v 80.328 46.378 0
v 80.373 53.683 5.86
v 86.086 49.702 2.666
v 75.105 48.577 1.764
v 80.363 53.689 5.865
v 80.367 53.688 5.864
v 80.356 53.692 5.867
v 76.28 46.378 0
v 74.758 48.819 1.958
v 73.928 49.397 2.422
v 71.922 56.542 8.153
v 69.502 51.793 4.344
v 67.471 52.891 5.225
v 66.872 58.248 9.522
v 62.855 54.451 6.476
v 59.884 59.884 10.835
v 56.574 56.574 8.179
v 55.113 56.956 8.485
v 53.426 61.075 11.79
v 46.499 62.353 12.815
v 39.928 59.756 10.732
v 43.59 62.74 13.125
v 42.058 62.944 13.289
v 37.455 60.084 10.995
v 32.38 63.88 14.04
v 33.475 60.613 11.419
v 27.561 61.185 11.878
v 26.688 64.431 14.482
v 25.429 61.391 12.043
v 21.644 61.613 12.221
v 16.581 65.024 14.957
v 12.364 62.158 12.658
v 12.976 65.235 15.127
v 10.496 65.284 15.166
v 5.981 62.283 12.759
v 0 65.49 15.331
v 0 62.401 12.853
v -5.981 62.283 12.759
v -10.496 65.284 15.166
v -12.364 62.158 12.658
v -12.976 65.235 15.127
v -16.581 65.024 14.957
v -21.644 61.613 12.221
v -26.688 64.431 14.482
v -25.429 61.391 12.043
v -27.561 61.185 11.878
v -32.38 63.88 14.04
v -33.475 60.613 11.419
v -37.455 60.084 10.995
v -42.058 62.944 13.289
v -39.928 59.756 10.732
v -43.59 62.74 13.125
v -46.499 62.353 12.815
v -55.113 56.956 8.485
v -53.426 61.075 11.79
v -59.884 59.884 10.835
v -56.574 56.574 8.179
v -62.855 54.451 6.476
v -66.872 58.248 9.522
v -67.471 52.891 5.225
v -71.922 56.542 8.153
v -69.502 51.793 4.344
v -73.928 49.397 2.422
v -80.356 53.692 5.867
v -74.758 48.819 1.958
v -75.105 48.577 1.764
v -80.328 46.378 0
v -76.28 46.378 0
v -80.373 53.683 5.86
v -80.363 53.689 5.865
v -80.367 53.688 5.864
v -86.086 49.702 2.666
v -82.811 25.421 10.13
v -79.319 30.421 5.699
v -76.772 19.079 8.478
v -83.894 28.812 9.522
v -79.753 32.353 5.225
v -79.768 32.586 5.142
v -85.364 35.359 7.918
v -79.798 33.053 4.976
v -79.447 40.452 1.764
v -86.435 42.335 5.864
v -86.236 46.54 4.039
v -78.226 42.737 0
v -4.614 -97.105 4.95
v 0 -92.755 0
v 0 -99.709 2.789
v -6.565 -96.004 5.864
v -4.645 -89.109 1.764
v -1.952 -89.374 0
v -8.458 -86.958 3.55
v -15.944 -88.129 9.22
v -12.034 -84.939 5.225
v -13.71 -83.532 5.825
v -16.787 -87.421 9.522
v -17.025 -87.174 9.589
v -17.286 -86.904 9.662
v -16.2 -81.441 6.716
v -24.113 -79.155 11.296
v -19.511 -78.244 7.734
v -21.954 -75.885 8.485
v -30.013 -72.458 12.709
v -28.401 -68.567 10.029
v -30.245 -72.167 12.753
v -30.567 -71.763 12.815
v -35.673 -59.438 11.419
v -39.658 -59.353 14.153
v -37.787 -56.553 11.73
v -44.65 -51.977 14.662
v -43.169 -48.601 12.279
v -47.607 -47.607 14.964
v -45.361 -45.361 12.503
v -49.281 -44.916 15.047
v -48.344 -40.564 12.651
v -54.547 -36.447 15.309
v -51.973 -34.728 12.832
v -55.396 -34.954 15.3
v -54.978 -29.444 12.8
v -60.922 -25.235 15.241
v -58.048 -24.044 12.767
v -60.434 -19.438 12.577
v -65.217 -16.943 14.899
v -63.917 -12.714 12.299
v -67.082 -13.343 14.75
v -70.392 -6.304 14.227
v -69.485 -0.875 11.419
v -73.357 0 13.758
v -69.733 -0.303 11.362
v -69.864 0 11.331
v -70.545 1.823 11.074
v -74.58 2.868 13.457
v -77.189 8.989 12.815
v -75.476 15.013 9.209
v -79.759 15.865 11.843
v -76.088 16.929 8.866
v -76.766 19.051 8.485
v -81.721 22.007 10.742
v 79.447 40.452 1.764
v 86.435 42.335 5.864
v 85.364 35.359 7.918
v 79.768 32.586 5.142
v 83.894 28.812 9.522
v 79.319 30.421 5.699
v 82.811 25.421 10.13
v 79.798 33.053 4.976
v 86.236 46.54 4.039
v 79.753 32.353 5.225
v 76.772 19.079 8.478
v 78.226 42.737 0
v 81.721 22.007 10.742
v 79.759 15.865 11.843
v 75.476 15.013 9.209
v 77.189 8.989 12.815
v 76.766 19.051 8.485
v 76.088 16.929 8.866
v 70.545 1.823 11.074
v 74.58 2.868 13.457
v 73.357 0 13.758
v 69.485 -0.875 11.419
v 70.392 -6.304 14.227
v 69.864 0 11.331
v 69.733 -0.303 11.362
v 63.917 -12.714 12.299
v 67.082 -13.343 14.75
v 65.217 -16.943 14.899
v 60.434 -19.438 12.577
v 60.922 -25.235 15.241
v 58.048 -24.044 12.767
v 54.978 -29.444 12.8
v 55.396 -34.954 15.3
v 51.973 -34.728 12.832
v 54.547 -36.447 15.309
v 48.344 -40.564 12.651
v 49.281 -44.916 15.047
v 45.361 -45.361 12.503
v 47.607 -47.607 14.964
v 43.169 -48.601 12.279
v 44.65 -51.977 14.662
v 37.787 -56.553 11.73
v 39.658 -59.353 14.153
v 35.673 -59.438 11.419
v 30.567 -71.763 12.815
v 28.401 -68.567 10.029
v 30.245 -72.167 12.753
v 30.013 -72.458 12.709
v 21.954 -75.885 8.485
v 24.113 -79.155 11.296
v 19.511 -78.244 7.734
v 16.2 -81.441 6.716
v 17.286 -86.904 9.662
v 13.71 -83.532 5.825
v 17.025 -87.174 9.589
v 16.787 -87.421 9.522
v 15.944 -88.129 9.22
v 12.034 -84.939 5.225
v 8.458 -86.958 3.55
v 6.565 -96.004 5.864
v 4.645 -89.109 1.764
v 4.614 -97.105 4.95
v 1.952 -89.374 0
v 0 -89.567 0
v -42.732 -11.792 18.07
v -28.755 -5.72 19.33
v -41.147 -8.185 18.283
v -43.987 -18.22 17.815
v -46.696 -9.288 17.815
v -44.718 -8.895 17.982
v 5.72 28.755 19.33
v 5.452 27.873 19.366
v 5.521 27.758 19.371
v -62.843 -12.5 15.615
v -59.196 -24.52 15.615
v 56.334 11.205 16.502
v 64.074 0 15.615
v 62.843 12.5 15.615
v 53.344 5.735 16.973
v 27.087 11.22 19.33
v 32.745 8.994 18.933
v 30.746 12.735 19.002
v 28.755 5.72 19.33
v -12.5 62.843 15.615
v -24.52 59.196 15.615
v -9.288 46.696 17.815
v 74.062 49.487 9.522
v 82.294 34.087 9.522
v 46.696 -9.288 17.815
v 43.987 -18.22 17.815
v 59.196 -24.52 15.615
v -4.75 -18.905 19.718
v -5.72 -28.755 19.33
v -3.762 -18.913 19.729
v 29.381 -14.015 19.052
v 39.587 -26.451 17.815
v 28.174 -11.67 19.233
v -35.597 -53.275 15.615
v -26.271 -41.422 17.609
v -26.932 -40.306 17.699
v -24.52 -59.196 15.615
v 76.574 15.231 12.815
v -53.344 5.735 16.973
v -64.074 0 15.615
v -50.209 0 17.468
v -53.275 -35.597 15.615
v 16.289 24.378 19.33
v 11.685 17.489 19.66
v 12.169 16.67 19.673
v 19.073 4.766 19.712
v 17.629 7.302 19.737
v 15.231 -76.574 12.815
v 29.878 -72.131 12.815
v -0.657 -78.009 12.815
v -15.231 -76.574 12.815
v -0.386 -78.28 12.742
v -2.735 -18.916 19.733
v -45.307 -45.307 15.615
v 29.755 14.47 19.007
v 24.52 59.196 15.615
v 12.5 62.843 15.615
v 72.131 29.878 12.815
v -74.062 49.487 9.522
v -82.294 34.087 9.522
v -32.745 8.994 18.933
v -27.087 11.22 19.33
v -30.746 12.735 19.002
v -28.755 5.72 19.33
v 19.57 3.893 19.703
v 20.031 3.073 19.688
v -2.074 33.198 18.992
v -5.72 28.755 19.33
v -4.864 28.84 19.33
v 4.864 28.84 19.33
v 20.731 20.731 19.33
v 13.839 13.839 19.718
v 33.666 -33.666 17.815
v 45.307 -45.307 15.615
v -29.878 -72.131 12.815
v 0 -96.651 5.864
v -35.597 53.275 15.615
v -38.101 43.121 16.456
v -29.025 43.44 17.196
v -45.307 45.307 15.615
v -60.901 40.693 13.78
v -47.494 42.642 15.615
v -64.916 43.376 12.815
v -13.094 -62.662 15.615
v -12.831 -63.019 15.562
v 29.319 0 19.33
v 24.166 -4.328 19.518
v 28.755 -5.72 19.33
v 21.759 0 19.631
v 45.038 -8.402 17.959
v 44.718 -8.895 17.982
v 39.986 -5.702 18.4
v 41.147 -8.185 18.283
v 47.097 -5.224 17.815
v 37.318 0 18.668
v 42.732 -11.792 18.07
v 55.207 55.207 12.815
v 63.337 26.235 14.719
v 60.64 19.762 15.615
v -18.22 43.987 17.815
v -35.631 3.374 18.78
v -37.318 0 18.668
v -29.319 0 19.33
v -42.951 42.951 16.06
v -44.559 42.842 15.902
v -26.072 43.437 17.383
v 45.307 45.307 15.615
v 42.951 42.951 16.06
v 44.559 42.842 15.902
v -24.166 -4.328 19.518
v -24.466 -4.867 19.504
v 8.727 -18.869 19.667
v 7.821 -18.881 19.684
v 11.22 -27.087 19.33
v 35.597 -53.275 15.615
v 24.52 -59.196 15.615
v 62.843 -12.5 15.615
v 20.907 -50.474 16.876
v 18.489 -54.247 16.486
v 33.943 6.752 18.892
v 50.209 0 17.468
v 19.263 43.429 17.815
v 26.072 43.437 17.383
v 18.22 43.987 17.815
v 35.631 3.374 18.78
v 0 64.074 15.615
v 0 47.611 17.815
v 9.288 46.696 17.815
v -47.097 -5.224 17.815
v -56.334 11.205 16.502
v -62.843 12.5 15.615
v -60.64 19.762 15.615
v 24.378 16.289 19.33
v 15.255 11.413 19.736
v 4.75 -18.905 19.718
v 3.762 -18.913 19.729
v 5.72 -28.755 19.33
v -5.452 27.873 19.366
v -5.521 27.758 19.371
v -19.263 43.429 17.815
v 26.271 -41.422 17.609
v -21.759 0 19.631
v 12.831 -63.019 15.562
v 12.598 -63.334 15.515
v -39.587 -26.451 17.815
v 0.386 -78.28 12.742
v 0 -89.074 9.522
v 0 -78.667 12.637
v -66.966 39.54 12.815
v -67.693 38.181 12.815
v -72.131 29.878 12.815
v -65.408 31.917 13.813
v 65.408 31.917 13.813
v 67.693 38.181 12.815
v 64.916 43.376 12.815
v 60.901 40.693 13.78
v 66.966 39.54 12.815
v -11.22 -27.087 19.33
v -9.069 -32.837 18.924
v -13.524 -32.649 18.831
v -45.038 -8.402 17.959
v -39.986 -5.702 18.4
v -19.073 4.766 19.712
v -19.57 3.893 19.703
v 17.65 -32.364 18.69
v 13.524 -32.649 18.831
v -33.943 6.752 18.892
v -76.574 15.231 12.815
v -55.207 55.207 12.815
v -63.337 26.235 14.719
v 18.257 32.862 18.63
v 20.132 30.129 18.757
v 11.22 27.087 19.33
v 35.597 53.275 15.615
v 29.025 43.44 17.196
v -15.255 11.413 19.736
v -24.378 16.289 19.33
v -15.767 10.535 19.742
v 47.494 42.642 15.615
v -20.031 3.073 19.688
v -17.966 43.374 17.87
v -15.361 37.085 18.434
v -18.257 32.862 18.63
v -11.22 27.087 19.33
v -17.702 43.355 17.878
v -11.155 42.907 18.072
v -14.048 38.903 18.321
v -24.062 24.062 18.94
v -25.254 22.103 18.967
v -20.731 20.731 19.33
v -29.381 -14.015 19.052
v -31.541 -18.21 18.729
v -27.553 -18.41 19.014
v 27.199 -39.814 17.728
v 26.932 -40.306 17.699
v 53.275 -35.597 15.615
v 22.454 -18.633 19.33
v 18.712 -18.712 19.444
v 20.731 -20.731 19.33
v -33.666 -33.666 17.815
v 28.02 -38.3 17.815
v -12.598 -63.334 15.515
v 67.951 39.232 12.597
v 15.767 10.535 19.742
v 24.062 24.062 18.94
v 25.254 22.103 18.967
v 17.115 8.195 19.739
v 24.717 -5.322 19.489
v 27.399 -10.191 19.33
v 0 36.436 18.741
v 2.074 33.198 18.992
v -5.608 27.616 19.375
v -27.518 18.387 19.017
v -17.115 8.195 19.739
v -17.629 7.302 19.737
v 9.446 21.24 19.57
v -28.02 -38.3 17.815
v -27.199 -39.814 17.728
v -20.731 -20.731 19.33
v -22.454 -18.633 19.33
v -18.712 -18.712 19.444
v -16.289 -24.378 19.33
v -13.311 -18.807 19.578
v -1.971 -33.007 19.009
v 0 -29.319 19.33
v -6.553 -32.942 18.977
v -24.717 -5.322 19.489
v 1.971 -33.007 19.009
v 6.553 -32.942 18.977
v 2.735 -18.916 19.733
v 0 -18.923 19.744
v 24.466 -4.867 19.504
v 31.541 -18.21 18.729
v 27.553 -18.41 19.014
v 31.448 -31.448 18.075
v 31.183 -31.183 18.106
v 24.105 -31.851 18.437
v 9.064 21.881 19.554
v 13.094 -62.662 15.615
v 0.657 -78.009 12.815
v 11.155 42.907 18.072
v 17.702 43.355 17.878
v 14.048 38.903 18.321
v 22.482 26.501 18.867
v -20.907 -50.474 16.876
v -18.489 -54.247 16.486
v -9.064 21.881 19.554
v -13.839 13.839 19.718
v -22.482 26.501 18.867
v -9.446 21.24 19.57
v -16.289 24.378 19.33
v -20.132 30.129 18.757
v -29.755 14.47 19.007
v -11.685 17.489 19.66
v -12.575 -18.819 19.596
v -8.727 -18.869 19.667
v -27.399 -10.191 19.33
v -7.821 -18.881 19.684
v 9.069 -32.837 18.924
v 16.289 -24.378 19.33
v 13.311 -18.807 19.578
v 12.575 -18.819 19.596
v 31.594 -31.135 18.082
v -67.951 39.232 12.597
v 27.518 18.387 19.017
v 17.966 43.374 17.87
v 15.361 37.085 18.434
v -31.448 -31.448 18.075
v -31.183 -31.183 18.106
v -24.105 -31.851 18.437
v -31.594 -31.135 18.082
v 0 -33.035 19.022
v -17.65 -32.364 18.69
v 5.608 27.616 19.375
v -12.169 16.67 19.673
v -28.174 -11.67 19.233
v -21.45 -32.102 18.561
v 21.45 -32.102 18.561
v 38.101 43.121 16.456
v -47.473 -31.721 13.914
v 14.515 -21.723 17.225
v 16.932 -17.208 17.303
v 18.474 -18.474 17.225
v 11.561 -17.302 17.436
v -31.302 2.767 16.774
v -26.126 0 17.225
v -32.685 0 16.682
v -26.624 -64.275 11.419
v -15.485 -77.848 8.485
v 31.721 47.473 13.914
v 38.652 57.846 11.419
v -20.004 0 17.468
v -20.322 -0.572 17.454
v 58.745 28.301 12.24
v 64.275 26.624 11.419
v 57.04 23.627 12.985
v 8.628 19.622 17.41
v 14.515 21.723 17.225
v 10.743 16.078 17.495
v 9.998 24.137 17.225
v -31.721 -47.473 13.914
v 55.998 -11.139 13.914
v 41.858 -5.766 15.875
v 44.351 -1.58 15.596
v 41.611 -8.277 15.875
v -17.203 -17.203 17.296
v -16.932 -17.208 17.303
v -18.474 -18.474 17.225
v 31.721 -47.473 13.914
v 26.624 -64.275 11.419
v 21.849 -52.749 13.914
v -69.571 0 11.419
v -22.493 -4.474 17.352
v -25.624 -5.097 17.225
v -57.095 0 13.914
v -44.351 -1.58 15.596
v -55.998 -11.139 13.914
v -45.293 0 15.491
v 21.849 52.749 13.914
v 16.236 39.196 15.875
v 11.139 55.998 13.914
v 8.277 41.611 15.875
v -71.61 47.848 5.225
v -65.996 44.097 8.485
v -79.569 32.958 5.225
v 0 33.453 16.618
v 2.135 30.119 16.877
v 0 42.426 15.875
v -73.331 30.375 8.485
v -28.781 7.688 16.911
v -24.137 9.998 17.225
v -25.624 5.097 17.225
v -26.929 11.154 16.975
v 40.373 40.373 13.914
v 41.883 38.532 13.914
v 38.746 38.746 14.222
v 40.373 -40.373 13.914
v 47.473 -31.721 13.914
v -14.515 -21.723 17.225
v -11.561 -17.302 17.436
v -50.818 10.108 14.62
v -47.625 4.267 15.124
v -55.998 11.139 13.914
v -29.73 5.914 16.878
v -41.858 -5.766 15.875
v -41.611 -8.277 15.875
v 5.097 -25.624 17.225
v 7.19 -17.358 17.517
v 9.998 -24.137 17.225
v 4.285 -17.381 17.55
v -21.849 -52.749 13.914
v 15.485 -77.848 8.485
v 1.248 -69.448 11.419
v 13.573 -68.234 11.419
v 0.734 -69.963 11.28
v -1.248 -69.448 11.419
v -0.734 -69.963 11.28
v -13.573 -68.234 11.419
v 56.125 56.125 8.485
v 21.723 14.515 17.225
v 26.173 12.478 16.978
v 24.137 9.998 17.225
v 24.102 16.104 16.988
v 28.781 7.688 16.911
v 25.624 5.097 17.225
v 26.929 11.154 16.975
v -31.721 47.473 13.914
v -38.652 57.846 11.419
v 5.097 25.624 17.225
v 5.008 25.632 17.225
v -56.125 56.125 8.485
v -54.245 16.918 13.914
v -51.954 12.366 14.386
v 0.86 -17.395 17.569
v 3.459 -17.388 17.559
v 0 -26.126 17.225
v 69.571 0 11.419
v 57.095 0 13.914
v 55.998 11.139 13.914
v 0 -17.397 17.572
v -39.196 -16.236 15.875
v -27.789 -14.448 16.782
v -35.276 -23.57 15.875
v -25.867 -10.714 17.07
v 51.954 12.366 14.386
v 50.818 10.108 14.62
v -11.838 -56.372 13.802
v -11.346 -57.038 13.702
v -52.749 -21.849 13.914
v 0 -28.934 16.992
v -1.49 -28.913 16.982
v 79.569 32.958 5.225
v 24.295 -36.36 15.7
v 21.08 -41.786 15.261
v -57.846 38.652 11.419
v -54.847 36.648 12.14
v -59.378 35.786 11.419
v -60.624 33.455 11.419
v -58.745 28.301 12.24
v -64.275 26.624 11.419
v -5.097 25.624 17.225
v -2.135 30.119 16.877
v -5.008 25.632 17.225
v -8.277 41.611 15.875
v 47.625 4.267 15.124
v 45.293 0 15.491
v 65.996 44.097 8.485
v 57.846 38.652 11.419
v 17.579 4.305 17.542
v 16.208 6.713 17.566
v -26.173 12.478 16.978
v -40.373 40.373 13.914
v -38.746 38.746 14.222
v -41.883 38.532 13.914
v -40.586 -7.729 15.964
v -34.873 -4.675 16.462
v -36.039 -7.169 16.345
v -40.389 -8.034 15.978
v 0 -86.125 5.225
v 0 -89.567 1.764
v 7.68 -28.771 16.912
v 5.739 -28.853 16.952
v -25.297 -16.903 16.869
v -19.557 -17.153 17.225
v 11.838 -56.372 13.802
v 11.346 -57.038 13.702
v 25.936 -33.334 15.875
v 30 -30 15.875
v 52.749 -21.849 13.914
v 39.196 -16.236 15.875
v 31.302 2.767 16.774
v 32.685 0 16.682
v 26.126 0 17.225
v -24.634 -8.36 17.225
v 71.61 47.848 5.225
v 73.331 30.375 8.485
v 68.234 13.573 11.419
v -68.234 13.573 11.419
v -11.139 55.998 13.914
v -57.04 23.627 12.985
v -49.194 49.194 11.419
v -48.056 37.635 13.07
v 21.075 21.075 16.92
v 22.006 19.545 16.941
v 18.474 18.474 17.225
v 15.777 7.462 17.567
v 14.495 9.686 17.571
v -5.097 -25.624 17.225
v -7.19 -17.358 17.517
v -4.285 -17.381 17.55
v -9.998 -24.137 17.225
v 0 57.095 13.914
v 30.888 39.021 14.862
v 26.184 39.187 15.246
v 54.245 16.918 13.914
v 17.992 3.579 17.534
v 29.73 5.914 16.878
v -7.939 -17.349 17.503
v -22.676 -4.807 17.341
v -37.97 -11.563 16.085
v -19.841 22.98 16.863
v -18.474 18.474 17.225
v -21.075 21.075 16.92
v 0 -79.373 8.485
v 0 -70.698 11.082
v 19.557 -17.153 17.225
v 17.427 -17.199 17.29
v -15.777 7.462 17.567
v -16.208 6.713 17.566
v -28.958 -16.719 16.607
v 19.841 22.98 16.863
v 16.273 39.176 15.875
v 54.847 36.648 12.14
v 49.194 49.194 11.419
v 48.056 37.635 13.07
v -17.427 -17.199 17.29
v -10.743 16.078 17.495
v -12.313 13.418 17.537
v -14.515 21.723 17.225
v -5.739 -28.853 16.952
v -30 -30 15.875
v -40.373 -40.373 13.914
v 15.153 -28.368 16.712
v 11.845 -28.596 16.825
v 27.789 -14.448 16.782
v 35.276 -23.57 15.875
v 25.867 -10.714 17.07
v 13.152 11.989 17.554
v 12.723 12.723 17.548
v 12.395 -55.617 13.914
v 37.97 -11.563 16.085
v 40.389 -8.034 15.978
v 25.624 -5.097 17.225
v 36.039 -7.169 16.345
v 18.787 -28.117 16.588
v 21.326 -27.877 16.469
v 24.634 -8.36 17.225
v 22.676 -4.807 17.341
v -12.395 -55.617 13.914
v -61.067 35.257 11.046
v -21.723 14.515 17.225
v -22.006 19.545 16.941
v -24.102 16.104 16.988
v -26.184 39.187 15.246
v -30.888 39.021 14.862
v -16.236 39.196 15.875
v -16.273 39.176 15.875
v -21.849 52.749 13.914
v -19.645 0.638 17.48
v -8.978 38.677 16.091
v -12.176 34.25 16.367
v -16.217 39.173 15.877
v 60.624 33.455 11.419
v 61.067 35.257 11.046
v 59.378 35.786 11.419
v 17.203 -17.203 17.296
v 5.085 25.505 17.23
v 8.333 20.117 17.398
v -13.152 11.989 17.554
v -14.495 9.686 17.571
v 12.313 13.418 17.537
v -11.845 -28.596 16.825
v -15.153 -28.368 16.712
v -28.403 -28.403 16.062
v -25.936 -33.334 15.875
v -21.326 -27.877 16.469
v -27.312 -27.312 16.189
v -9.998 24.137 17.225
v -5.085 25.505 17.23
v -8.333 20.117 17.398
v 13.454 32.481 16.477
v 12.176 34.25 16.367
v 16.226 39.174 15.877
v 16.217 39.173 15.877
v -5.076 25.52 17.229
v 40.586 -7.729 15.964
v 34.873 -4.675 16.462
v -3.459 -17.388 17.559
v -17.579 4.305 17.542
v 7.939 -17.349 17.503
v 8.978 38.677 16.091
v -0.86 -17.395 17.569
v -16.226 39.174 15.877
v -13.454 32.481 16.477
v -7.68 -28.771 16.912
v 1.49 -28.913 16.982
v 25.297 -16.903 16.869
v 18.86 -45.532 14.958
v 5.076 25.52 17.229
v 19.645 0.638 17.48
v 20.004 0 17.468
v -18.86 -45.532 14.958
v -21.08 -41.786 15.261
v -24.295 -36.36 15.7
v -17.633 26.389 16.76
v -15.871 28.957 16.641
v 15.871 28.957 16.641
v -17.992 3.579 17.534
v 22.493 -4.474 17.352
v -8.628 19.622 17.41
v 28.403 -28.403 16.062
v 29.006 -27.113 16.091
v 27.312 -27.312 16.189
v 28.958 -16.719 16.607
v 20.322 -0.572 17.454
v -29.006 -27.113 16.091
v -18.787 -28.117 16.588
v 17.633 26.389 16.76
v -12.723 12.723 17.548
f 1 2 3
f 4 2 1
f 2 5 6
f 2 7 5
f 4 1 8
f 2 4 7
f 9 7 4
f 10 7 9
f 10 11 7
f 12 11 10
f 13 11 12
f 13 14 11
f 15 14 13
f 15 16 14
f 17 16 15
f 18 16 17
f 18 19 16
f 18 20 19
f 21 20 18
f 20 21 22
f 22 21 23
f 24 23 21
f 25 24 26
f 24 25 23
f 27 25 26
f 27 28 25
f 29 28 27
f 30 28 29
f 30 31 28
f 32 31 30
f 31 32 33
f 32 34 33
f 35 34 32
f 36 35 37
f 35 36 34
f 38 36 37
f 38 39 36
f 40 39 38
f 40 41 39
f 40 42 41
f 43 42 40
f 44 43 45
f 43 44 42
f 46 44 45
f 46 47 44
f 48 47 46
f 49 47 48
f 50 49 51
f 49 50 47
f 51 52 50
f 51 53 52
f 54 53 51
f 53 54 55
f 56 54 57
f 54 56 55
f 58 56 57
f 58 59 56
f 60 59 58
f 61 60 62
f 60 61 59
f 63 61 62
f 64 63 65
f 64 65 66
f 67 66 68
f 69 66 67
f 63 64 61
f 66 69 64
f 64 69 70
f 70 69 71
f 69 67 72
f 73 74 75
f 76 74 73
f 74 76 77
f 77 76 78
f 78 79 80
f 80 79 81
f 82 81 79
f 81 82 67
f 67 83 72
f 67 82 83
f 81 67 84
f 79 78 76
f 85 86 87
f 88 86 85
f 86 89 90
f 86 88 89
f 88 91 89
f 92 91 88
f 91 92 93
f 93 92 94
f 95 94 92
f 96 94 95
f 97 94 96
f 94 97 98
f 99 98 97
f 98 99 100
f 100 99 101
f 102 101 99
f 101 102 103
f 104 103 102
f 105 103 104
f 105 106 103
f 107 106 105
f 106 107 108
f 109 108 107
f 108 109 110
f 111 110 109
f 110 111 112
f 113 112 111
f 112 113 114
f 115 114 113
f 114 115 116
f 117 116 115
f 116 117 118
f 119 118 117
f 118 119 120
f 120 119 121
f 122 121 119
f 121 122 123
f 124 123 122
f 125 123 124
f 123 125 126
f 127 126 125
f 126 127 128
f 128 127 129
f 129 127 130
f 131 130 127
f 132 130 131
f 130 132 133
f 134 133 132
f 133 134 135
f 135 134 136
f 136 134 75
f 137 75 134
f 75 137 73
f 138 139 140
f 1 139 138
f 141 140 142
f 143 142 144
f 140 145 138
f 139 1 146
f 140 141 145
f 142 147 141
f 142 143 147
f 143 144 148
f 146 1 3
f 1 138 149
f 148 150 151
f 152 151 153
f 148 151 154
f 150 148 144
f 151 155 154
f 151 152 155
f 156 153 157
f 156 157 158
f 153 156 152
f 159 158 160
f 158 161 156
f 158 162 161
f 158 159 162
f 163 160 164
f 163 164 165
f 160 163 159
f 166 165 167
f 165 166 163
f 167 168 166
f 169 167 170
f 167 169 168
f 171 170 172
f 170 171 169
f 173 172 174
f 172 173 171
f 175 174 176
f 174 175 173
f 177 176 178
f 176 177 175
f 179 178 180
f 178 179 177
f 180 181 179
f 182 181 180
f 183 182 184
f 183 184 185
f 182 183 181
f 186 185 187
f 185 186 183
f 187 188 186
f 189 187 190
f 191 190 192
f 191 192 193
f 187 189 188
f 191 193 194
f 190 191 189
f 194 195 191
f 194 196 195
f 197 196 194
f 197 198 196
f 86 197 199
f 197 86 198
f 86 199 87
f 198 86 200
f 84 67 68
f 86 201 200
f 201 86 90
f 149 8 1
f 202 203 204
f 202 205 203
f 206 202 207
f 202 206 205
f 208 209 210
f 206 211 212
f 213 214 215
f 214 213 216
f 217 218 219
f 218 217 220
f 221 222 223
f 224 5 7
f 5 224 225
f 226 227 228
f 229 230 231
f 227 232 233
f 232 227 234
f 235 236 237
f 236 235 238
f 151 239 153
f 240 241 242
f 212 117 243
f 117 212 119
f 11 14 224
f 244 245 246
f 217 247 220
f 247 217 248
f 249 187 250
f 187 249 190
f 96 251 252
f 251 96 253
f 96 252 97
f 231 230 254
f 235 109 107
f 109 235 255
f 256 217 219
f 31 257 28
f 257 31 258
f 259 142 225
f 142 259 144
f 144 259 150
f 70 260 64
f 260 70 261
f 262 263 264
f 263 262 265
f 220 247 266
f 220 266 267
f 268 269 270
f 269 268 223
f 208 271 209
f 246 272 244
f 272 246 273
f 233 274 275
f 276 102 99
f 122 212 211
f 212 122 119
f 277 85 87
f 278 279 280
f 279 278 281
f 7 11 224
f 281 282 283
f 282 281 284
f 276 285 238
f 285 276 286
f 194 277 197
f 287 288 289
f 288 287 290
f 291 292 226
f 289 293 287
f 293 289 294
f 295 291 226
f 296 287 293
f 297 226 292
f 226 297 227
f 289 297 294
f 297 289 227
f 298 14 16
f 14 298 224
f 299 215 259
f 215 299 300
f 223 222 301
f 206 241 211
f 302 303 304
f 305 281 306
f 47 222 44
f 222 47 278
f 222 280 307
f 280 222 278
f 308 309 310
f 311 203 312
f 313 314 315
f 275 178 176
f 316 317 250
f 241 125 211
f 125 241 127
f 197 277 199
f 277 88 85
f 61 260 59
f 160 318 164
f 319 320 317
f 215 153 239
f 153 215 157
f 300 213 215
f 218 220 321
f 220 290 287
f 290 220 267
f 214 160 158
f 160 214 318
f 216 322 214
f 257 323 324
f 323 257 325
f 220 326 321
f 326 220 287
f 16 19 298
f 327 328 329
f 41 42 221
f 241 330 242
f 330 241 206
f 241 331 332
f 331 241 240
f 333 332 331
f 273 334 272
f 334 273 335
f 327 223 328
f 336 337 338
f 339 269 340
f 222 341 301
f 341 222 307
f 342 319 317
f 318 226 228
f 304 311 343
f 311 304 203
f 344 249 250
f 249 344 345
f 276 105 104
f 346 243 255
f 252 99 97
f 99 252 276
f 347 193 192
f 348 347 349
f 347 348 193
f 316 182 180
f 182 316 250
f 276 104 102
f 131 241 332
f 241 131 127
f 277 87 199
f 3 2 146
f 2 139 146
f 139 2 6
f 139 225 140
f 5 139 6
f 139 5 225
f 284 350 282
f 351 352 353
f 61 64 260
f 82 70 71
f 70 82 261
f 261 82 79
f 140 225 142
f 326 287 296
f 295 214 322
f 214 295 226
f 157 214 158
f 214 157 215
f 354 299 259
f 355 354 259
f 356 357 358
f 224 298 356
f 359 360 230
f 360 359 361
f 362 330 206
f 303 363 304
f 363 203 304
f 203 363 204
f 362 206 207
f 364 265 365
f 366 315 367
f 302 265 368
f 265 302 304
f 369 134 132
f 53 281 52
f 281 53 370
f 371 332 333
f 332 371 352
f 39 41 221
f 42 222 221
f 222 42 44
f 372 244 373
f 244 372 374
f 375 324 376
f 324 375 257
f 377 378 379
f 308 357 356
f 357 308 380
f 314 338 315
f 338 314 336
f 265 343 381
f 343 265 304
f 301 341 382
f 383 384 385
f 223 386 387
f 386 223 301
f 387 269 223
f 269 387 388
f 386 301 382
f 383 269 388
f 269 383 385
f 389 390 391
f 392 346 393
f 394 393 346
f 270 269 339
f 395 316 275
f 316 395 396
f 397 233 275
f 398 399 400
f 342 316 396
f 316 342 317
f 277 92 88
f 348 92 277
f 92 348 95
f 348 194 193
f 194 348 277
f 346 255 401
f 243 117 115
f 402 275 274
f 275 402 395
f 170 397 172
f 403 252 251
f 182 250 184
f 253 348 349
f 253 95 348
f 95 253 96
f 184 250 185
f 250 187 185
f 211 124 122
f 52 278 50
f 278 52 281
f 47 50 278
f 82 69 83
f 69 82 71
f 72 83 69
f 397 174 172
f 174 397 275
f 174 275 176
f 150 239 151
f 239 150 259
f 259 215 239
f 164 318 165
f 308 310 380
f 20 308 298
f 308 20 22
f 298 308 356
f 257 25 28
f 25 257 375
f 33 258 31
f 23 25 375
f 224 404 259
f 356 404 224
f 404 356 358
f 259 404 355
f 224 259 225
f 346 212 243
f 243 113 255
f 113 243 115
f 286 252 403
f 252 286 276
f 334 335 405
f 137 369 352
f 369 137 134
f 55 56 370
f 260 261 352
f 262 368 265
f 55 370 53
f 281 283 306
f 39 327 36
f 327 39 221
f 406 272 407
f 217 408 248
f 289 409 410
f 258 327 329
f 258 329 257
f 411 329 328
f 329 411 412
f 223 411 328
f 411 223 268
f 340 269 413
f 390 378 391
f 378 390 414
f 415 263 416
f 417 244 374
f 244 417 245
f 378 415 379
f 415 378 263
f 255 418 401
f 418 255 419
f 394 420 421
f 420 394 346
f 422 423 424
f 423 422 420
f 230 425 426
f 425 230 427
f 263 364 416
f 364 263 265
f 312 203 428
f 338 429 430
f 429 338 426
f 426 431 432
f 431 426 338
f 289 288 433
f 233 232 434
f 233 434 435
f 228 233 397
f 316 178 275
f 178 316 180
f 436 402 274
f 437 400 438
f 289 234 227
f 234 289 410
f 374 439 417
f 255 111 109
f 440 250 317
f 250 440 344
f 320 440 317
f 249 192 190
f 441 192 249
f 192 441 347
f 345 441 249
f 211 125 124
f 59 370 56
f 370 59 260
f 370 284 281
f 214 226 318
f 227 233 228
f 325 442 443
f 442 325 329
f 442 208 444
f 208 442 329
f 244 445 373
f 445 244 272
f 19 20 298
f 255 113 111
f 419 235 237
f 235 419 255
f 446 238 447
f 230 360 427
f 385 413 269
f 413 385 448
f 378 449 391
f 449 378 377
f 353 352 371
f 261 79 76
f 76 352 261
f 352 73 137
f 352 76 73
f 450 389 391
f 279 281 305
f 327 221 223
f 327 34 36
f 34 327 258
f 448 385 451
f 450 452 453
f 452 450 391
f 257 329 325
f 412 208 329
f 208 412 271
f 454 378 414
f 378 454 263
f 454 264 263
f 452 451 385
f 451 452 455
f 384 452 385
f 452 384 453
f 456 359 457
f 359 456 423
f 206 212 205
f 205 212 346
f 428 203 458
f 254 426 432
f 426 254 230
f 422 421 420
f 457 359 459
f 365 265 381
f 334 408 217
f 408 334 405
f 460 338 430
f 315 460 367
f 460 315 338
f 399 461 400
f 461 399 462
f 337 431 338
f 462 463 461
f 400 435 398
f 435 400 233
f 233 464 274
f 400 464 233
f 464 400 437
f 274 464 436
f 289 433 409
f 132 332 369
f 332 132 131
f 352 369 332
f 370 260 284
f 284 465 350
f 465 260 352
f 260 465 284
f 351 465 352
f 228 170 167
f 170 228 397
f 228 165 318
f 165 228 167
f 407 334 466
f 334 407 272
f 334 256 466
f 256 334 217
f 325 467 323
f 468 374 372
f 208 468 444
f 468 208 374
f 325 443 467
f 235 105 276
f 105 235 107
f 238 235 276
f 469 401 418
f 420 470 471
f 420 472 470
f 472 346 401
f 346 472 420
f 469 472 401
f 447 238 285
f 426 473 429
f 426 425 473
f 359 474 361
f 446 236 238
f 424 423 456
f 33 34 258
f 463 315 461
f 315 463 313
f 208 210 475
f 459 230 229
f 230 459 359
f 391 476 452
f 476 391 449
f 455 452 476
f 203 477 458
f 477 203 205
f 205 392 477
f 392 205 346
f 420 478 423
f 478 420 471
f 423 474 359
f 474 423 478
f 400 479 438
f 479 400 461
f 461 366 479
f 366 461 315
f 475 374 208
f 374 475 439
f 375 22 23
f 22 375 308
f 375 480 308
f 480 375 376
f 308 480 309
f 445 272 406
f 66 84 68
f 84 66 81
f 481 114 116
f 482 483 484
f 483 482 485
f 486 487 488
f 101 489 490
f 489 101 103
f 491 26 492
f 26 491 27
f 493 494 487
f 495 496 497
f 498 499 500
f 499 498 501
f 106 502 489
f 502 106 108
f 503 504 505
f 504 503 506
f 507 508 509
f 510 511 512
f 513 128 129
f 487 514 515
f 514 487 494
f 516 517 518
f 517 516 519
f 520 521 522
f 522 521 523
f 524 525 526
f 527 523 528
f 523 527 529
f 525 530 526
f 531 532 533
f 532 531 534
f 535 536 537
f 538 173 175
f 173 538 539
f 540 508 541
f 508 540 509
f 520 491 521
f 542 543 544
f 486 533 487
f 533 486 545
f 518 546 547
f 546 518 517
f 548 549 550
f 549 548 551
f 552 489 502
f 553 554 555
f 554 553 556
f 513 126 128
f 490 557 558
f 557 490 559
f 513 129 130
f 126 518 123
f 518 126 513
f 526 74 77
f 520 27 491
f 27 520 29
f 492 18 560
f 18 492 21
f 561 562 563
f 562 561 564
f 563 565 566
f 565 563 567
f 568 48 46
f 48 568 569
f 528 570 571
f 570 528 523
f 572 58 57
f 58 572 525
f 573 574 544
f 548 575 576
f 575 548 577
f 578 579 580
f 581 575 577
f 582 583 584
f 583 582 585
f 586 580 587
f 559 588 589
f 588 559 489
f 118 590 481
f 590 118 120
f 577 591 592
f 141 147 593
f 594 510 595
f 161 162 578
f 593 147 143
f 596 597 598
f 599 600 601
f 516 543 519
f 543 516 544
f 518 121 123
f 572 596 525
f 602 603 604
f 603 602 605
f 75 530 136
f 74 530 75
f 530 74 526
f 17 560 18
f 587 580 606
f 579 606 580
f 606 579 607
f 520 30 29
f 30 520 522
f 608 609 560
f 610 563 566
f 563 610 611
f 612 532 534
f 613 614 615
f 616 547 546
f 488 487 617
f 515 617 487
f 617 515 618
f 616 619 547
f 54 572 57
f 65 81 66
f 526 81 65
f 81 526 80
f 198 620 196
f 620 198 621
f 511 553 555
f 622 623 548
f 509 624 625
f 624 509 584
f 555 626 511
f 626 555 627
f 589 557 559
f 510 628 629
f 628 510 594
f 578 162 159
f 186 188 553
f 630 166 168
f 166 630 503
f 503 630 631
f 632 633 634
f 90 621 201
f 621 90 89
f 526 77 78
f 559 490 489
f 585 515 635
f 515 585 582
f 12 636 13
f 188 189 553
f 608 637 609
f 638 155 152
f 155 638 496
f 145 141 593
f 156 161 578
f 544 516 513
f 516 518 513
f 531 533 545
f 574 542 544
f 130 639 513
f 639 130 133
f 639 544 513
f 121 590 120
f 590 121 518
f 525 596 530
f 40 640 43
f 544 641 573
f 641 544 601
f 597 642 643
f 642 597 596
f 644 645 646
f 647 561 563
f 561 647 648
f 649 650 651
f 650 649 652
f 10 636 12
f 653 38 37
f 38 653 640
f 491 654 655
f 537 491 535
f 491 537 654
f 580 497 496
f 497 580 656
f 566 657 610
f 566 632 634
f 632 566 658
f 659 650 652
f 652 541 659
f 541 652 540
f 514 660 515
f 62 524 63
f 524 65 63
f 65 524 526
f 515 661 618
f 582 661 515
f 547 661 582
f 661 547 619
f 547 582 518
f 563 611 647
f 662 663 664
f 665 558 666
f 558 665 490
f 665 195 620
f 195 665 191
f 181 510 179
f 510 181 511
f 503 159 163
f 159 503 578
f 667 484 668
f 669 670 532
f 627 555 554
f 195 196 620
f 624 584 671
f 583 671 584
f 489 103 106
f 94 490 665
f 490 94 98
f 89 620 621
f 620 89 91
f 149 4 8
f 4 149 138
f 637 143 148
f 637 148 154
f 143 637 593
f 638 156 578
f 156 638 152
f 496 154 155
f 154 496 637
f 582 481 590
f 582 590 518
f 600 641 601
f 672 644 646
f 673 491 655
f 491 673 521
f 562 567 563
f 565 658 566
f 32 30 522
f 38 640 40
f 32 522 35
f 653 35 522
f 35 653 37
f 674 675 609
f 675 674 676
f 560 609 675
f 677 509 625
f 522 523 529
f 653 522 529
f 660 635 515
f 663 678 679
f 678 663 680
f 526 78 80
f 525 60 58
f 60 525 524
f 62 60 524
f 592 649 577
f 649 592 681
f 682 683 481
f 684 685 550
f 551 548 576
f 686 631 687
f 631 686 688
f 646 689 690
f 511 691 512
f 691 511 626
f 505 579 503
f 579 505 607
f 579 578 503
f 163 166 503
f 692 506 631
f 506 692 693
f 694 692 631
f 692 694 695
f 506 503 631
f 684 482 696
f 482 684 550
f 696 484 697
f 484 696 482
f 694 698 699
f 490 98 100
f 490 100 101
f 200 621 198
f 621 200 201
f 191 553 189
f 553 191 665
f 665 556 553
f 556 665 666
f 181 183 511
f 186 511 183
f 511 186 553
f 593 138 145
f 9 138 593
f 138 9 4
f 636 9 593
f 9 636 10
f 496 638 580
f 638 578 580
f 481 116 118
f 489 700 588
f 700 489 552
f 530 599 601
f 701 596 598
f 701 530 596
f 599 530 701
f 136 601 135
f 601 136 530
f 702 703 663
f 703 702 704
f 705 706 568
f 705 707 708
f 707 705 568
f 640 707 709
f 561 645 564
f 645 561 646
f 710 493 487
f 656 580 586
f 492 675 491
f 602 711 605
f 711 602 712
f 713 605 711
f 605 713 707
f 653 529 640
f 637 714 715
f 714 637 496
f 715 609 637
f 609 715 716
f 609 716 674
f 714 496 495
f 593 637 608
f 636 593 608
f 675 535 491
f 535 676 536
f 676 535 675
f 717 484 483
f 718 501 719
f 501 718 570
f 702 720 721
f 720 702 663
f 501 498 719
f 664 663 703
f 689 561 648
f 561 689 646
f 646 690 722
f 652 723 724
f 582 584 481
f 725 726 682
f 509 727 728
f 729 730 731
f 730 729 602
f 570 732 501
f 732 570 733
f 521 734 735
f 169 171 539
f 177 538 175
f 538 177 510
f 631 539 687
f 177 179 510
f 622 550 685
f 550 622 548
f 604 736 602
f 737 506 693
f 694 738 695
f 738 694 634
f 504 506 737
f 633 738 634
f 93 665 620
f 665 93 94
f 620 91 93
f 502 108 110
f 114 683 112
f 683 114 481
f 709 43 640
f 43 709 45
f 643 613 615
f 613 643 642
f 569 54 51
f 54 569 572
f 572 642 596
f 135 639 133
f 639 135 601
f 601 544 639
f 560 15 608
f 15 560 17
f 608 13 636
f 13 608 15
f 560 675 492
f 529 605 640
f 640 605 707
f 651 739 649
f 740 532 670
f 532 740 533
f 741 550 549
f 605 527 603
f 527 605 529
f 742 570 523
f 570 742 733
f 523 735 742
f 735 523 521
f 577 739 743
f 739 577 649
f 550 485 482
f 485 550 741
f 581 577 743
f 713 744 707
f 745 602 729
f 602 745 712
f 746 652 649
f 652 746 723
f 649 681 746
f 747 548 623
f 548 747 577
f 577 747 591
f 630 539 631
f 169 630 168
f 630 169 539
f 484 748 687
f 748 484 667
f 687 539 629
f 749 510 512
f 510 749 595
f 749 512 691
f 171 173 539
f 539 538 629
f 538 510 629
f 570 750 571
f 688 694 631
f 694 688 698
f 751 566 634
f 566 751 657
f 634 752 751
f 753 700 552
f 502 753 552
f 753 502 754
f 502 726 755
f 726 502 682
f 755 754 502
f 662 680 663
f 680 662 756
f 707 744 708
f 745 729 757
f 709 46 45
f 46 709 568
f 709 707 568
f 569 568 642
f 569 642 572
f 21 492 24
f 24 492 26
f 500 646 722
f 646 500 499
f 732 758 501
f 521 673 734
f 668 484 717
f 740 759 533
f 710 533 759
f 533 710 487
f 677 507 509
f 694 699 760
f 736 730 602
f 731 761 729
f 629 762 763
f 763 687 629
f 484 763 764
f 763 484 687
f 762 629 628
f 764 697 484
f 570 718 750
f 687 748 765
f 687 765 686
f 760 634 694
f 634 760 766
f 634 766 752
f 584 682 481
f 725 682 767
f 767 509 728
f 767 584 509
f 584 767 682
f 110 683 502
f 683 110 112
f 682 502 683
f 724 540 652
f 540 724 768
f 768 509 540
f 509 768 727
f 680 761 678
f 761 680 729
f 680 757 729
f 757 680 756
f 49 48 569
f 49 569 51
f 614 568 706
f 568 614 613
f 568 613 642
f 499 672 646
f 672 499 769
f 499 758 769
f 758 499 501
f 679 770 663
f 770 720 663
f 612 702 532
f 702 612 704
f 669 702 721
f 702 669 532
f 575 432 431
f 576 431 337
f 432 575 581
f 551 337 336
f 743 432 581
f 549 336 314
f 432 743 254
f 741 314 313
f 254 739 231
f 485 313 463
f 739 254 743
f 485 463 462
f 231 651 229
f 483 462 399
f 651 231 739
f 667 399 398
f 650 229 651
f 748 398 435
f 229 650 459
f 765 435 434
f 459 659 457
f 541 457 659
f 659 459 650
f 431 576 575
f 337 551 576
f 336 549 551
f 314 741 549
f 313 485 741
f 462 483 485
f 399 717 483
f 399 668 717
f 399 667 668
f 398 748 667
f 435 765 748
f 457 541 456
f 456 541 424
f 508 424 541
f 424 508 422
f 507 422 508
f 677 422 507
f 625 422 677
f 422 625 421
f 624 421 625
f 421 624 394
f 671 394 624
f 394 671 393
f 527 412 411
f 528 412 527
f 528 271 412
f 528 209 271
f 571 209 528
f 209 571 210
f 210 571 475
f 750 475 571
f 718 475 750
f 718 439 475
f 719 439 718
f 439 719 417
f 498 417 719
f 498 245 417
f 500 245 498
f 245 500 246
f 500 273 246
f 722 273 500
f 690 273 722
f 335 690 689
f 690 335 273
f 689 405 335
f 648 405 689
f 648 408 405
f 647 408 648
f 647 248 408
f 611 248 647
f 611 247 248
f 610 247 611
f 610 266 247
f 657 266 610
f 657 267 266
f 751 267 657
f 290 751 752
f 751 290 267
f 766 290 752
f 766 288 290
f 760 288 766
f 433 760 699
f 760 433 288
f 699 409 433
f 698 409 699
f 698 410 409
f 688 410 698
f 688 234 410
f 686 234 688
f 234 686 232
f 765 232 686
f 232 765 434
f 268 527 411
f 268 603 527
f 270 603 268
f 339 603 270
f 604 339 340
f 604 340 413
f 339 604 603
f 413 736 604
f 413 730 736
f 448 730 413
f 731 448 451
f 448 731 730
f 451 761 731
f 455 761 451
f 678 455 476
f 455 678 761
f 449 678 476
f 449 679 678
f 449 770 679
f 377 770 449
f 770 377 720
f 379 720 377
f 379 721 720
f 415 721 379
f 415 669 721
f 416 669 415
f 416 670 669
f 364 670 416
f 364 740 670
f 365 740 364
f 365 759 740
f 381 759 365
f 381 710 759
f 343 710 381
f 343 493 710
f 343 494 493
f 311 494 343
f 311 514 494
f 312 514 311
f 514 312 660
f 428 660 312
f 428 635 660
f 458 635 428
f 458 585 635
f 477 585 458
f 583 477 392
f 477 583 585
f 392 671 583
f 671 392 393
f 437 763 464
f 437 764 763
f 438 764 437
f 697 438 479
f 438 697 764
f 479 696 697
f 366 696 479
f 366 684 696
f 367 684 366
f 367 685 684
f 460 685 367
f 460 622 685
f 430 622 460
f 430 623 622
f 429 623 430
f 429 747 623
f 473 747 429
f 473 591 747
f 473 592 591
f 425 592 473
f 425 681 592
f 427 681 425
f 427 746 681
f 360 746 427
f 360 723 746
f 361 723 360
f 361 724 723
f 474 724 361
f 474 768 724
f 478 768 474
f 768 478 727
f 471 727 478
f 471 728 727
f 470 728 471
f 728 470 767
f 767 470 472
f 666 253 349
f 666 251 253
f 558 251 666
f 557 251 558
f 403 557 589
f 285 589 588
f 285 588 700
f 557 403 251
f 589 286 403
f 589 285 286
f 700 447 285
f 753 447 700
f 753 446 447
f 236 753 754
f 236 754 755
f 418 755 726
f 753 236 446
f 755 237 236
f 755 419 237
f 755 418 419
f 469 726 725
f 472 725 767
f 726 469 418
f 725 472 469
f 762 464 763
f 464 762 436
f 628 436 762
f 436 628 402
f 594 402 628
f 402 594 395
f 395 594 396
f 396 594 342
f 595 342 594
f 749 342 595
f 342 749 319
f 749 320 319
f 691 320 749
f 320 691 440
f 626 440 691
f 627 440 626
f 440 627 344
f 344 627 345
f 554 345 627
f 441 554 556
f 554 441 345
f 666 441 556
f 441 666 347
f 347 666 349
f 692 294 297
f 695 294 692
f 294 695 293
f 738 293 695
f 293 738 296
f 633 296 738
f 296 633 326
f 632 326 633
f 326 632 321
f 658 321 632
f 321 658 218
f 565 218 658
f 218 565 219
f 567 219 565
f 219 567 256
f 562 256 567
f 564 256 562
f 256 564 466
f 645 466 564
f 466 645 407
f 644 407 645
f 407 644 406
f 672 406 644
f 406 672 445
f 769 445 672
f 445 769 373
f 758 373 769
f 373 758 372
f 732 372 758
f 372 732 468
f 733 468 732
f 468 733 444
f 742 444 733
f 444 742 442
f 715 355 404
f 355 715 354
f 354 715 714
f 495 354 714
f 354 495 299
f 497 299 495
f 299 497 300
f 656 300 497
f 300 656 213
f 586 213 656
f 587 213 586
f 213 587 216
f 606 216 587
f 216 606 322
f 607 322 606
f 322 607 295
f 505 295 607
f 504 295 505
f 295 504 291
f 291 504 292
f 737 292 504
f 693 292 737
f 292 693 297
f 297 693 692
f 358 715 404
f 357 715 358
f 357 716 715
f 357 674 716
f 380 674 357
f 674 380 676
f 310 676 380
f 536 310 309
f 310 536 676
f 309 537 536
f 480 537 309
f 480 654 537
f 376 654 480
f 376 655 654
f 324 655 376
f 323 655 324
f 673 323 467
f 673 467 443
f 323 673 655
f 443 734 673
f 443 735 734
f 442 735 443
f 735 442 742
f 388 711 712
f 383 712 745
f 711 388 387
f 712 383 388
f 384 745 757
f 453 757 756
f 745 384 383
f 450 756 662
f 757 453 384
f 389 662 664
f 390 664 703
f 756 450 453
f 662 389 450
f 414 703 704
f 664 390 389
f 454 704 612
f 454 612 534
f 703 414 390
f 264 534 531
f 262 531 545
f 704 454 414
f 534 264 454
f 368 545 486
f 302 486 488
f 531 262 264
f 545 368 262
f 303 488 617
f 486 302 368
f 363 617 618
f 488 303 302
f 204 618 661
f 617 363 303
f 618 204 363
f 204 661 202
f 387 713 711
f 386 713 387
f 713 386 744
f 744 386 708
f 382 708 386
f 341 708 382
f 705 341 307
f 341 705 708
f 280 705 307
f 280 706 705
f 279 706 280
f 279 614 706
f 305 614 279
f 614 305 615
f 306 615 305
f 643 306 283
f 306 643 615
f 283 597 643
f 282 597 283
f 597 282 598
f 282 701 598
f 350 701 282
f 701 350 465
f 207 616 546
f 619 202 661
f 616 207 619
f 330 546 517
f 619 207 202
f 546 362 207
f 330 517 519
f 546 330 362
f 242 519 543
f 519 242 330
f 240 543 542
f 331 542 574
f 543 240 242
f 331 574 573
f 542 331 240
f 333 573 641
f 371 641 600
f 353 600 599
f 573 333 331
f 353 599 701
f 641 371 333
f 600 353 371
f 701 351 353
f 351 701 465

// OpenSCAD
//$fn=128;
$fn=32;

sphereSize=100;
cutDepth=10;

triforce();

rotate([0,0,180]) {
  //plate();

//  translate([0,0,10]) triforce();

}
//groovySphere();

module groovySphere() {
  difference() {
    sphere(r=100);
    color("gray") {
      mainTriangle(14,49);
    }
  }

}

module triforce() {
  tSize=8;
 scale([1,1,0.2]) difference() {
    mainTriangle(14,45);
  
    color("teal") {
      rotate([0,0,180]) triangleChopper(tSize,5);
      rotate([30,0,0]) triangleChopper(tSize,5);
      rotate([0,0,120]) rotate([30,0,0]) triangleChopper(tSize,5);
      rotate([0,0,240]) rotate([30,0,0]) triangleChopper(tSize,5);
    }
  }
}

module plate() {
  translate([0,0,10]) scale([1,1,0.2]) intersection() {
    groovySphere();
    translate([-100,-100,0]) cube([200,200,100]);
  }
  cylinder(r=100,h=10);
}

module mainTriangle(angle,dist) {

  difference() {
    intersection() {
      triangleChopper(angle,dist);
      translate([-100,-100,0]) cube([200,200,200]);
      sphere(r=sphereSize+1);
    }
    sphere(r=sphereSize-cutDepth);
  }
}

module triangleChopper(angle,dist) {
  size=2000;
  intersection() {
    triangleBit(angle,dist,size);
    rotate([0,0,120]) triangleBit(angle,dist,size);
    rotate([0,0,240]) triangleBit(angle,dist,size);
  }
}

module triangleBit(ang,dist,size) {
  rotate([-ang,0,0]) translate([0,dist,0]) rotate([90,0,0]) {
    translate([-size/2,-size/2,0]) cube([size,size,size]);
  };
}
